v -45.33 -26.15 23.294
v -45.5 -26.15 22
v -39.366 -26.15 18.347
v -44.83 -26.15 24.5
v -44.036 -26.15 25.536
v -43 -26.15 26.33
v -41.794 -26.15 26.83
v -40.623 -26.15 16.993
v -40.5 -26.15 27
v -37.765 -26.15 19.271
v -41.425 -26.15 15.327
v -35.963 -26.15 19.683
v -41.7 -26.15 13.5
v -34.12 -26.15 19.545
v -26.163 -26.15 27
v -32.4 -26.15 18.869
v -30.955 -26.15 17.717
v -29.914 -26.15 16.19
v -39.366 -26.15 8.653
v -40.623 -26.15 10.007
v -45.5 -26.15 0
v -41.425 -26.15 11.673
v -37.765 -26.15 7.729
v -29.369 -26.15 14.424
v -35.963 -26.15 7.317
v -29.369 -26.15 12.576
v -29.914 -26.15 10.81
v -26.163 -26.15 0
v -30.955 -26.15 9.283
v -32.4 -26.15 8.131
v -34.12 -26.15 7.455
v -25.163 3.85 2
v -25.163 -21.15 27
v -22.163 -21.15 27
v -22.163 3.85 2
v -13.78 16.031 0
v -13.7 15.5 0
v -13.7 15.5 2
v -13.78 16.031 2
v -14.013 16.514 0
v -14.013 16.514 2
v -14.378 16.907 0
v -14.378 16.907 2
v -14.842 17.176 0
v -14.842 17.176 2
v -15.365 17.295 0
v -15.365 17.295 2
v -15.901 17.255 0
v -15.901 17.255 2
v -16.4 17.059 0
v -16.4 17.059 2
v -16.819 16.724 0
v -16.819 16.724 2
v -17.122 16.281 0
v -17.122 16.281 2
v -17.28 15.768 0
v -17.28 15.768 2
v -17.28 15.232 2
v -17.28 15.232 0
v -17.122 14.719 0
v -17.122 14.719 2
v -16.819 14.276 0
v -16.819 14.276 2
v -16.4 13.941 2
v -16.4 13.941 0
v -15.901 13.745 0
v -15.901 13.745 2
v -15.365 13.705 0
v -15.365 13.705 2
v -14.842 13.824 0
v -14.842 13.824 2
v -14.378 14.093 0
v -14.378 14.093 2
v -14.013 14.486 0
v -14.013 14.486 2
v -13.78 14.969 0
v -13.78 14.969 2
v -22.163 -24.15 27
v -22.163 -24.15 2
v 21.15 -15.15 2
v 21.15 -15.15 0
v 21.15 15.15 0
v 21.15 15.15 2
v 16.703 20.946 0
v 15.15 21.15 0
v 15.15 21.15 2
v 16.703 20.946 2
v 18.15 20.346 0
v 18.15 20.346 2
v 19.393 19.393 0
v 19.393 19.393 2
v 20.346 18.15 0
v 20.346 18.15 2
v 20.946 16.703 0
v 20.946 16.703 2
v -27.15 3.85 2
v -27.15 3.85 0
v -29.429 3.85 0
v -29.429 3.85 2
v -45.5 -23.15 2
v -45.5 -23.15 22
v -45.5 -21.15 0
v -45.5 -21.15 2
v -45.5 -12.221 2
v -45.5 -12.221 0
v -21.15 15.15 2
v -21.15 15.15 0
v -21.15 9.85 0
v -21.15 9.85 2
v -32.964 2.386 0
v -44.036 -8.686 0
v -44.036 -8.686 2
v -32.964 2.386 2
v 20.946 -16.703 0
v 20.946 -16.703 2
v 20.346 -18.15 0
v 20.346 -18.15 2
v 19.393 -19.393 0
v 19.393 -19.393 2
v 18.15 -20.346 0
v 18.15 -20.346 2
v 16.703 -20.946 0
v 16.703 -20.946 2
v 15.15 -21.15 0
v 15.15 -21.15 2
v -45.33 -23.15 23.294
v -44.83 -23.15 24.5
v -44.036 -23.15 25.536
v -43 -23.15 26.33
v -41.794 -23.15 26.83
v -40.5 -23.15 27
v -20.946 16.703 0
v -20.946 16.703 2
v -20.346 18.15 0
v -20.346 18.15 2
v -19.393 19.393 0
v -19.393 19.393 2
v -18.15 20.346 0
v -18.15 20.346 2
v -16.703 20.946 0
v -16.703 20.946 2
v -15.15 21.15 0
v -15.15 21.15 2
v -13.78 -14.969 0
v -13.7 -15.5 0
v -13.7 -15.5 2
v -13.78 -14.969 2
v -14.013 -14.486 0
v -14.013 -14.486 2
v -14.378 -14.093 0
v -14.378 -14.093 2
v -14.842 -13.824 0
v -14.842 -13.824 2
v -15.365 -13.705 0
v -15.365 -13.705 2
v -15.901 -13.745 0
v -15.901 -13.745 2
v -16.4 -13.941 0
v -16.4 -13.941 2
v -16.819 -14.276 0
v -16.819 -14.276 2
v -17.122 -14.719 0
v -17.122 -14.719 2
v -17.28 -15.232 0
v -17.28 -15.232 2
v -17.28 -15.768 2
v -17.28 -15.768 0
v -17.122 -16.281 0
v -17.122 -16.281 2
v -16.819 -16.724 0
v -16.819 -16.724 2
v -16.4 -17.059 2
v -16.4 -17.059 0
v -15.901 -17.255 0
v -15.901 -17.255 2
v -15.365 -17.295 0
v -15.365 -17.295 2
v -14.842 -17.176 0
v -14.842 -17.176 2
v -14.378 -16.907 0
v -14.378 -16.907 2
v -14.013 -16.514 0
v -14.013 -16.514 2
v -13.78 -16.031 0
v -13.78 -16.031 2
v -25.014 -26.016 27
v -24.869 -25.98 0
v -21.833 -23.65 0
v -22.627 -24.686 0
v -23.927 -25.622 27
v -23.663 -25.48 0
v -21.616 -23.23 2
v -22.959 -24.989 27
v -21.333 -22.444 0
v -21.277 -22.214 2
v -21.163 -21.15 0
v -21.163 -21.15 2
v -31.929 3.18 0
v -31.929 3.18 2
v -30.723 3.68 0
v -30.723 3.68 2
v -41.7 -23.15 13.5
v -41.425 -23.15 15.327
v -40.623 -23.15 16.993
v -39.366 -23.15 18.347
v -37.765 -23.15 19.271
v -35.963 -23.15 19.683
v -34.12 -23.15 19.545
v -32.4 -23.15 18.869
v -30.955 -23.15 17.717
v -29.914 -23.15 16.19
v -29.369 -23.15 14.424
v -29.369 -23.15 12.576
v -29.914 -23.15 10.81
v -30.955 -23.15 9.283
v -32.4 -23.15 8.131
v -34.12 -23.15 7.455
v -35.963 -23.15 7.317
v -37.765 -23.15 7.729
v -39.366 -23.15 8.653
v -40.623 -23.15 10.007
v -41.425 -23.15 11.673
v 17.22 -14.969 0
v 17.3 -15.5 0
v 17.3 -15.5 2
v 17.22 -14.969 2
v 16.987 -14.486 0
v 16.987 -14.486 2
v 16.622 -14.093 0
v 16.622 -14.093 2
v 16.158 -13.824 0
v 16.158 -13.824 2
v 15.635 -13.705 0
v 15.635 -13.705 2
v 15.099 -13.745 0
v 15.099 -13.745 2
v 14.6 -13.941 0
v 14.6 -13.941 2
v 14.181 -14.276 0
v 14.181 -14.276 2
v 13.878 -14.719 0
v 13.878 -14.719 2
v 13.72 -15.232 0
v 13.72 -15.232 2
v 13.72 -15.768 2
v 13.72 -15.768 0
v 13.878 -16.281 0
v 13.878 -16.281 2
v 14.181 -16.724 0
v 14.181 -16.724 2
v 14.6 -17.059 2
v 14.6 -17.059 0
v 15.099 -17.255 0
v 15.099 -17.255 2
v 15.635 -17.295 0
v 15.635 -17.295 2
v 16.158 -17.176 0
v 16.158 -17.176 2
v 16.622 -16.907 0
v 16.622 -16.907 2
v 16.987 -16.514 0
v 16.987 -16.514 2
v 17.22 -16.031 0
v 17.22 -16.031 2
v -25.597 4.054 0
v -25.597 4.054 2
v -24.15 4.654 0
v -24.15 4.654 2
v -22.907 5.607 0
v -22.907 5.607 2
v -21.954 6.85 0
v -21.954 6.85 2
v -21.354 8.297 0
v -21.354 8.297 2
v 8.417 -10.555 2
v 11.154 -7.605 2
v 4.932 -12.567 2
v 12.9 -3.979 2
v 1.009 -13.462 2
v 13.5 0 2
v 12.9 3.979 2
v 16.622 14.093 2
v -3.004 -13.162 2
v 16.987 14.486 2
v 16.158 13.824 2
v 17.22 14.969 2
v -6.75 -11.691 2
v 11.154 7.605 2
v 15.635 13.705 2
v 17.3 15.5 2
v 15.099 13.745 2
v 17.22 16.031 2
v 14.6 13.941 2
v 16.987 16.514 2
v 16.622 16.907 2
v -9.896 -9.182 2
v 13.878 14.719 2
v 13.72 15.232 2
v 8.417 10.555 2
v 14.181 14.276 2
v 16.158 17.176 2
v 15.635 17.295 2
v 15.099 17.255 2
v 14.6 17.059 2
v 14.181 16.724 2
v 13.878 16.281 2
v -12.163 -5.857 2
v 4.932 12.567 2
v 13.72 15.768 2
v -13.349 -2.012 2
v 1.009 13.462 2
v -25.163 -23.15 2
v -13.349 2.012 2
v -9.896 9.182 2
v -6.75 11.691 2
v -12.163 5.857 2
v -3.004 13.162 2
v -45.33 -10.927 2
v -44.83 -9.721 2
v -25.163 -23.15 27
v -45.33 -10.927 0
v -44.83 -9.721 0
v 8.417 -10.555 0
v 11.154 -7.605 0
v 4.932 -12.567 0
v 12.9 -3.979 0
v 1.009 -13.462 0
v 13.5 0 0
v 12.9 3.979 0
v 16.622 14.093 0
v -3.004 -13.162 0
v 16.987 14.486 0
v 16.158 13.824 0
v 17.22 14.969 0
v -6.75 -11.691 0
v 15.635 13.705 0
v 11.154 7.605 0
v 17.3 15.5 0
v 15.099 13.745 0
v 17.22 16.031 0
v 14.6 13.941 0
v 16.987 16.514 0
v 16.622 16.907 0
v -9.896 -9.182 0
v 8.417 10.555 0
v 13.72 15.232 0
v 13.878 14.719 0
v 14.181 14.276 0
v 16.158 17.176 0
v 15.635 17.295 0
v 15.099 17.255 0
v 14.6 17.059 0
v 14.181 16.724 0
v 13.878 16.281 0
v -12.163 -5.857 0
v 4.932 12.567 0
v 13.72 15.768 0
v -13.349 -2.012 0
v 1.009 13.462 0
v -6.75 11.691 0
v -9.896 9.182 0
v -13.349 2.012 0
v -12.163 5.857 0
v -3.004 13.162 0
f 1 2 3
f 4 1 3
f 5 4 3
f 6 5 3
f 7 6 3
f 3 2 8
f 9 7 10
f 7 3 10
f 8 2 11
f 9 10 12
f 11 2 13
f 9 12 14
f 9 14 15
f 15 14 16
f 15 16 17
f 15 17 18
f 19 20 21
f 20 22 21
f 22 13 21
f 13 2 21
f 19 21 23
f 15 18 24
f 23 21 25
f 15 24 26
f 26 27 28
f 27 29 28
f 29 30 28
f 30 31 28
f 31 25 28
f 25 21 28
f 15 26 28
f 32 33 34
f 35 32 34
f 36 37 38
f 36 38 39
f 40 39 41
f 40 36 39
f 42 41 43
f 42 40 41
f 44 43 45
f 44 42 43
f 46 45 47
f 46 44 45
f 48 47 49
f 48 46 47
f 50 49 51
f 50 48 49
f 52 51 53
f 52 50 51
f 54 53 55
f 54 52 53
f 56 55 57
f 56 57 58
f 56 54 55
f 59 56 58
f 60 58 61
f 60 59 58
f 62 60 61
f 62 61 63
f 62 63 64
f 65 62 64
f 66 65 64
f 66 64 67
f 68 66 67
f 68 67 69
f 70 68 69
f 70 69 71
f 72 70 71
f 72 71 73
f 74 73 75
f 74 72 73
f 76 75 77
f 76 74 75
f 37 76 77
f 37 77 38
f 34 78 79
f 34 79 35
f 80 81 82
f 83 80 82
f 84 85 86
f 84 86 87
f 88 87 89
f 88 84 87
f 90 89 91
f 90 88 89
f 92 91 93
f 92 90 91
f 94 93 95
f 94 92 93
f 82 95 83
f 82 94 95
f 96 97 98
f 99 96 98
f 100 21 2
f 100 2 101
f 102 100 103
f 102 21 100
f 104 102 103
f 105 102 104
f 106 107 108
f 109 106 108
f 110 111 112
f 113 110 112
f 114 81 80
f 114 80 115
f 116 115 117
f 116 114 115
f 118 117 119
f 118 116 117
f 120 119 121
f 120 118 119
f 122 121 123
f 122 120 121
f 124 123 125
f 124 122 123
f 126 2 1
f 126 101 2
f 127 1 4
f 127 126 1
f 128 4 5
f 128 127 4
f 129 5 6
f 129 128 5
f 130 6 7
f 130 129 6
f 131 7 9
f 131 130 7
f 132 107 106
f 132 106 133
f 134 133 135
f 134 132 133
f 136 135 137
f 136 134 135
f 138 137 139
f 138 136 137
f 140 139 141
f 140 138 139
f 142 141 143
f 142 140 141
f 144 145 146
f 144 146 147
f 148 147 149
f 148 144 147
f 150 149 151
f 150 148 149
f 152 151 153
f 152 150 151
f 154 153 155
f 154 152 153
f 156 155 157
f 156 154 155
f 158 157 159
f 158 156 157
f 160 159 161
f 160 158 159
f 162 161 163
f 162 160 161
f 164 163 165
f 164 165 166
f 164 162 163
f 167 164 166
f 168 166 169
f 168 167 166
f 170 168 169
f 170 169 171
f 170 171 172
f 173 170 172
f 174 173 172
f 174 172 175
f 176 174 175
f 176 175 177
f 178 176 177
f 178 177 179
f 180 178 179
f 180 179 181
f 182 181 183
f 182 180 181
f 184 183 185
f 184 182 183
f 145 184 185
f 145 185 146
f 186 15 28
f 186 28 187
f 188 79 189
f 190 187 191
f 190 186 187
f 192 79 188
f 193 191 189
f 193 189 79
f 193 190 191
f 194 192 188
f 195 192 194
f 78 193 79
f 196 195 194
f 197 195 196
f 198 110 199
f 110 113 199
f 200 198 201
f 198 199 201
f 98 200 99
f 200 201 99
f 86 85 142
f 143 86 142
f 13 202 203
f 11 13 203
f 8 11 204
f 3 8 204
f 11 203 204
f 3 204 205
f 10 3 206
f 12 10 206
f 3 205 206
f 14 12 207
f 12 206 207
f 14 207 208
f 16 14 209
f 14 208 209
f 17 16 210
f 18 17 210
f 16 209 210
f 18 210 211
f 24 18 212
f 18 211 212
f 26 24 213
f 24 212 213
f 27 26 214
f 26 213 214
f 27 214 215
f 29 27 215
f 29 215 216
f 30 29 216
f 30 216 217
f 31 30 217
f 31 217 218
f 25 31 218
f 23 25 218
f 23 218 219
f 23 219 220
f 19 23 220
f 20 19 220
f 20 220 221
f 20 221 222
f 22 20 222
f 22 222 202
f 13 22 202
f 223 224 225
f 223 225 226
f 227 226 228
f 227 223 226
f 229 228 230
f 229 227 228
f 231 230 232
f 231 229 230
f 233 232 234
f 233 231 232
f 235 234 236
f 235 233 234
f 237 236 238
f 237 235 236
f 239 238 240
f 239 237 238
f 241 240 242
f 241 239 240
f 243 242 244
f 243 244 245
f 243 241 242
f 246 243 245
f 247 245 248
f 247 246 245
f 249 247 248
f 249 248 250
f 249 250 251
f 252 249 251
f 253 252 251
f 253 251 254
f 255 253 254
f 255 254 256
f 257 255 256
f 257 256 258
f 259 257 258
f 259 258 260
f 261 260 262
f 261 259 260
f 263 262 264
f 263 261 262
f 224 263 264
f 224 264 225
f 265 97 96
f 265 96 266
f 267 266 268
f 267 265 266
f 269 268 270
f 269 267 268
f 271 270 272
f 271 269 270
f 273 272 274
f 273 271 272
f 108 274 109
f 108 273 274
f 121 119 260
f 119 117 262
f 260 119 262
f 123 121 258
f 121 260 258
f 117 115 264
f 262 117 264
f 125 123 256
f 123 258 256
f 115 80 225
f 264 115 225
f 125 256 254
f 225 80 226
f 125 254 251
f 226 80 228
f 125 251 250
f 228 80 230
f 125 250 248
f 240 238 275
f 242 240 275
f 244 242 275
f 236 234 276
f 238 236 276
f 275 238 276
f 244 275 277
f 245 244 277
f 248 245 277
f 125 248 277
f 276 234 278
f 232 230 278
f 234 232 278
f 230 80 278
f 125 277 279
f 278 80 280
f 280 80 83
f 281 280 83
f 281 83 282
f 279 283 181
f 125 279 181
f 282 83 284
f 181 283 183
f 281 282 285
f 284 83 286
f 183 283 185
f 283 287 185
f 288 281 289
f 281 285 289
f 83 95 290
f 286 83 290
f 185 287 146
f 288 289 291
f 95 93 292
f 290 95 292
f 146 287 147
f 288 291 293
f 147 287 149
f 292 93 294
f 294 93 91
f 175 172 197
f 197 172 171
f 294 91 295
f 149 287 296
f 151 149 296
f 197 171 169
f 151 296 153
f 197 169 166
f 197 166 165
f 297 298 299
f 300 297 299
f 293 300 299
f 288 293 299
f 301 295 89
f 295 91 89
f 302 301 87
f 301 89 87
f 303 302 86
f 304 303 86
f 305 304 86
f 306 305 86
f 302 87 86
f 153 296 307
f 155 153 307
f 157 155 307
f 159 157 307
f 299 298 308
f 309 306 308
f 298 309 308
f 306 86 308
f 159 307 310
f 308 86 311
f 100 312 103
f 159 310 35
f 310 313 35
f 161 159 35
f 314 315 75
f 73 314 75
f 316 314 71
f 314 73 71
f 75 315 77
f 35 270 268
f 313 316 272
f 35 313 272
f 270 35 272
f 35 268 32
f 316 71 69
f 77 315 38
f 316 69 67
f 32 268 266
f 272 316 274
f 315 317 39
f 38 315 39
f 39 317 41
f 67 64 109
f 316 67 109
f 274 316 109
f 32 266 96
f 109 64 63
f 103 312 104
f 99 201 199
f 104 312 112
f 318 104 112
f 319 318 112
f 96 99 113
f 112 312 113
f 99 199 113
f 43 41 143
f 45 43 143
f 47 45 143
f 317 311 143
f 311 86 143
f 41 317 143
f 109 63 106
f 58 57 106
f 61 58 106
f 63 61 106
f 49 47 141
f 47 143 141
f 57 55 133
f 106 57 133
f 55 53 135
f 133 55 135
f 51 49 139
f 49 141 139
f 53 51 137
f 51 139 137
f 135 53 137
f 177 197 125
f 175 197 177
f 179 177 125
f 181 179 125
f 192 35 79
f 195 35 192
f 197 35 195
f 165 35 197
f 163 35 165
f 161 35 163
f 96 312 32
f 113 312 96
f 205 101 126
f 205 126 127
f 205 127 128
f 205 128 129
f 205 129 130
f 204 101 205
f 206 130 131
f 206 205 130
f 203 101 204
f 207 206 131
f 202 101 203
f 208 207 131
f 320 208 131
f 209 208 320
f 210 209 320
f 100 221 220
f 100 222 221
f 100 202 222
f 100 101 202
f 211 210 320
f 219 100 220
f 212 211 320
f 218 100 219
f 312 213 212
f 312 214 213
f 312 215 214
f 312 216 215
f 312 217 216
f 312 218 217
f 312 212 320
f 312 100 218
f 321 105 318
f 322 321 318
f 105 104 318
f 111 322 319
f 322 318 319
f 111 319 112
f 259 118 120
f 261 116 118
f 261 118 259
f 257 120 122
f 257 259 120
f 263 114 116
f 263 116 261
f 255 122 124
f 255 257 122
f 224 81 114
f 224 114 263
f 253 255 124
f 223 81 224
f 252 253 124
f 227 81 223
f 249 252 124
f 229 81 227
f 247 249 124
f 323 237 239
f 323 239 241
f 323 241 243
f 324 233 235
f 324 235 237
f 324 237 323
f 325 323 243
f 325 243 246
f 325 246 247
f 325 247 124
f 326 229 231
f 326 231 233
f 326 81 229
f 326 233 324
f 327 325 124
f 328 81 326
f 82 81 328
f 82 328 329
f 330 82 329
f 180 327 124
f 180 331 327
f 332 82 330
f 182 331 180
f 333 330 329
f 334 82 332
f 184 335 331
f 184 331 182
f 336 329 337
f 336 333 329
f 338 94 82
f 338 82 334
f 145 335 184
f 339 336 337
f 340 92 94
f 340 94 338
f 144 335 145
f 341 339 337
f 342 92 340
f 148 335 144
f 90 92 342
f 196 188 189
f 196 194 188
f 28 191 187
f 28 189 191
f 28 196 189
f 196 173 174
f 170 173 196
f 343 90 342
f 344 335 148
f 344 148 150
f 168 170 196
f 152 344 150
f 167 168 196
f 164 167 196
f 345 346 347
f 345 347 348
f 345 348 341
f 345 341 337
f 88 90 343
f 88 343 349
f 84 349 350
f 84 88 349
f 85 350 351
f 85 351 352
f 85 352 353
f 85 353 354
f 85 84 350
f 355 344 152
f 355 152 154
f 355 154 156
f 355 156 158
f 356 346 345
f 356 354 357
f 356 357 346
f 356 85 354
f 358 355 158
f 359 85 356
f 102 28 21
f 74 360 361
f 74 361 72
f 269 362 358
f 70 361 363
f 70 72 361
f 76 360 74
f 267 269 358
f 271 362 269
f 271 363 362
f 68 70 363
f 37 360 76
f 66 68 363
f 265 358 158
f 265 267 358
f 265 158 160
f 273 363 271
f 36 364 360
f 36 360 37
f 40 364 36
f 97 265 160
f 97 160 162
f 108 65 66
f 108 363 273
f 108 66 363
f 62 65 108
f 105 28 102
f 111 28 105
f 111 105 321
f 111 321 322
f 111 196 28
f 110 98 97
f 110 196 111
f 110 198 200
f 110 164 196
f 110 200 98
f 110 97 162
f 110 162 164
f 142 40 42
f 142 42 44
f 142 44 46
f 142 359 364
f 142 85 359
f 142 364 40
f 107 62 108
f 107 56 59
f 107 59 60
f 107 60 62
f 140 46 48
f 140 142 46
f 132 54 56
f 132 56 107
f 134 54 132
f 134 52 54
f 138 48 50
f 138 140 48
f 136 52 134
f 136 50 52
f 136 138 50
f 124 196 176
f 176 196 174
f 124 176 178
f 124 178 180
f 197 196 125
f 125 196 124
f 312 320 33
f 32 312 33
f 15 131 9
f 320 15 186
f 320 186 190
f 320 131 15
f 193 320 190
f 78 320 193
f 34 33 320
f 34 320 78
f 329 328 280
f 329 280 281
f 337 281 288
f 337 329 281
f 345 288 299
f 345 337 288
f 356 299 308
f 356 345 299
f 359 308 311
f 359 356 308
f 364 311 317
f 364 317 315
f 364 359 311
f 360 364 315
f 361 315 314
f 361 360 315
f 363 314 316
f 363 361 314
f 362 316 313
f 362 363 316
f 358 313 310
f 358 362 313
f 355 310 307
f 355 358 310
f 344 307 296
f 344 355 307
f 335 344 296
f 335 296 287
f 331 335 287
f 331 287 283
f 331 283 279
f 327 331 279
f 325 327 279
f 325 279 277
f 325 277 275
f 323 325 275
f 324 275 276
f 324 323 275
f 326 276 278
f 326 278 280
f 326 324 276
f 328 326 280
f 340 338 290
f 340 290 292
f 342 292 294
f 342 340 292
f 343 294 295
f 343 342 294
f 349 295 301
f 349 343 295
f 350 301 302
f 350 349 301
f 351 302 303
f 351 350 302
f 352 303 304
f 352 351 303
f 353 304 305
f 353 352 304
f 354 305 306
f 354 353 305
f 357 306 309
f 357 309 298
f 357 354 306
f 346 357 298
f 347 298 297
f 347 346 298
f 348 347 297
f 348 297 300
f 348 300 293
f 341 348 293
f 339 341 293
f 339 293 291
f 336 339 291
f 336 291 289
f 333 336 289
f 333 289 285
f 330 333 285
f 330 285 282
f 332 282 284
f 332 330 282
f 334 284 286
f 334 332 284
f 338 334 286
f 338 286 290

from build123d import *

# Parameters (mm, degrees)
F0_R         = 1.8
F0_R_2       = 13.5
F0_W         = 24.3372796029
F0_H         = 5
F1_DEPTH     = 2
F2_W         = 3
F2_H         = 30
F3_DEPTH     = 27
F4_W         = 20.3372796029
F4_H         = 3
F5_DEPTH     = 25
F7_SIZE      = 25
F8_SIZE      = 14
F9_R         = 4.99999
F10_T1_DEPTH = 2
F10_T3_DEPTH = 32
F6_R         = 6.2
F11_DEPTH    = 25


# Not quite as in the source:
# - a fillet or chamfer that OpenCascade refuses, or shapes differently, is made with other operations: its cross-section is extruded or revolved along the edge and cut away or added
# - a fillet or chamfer is up to 0.001 mm smaller than in the source, because OpenCascade refuses the exact size


with BuildPart() as f1:
    # F0 (on Top) → F1 (new body)
    with BuildSketch(Plane.XY):
        Polygon((21.15, -21.15), (21.15, 21.15), (-21.15, 21.15), (-21.15, 3.85), (-21.15, -21.15), align=None)
        with Locations((-15.5, -15.5)):
            Circle(F0_R, mode=Mode.SUBTRACT)
        with Locations((15.5, -15.5)):
            Circle(F0_R, mode=Mode.SUBTRACT)
        with Locations((-15.5, 15.5)):
            Circle(F0_R, mode=Mode.SUBTRACT)
        Circle(F0_R_2, mode=Mode.SUBTRACT)
        with Locations((15.5, 15.5)):
            Circle(F0_R, mode=Mode.SUBTRACT)
        Polygon((-21.15, -21.15), (-21.15, 3.85), (-45.5, 3.85), (-45.5, -21.15), (-21.1627203971, -21.15), align=None)
        with Locations((-33.3313601986, -23.65)):
            Rectangle(F0_W, F0_H)
    extrude(amount=F1_DEPTH)

    # F2 (on Top) → F3 (join)
    with BuildSketch(Plane.XY):
        with Locations((-23.6627203971, -11.15)):
            Rectangle(F2_W, F2_H)
    extrude(amount=F3_DEPTH)

    # F4 (on face) → F5 (join)
    with BuildSketch(Plane.XY.offset(2)):
        with Locations((-35.3313601986, -24.65)):
            Rectangle(F4_W, F4_H)
    extrude(amount=F5_DEPTH)

    # F7
    f7_edges = [f1.edges().sort_by_distance(p)[0] for p in [
        (-23.66272, 3.85, 27),
    ]]
    chamfer(f7_edges, length=F7_SIZE)

    # F8
    f8_edges = [f1.edges().sort_by_distance(p)[0] for p in [
        (-45.5, 3.85, 1),
    ]]
    chamfer(f8_edges, length=F8_SIZE)

    # F9 (radius 5 in the source; OpenCascade refuses exactly that, so slightly less here)
    f9_edges = [f1.edges().sort_by_distance(p)[0] for p in [
        (-45.5, -10.15, 1),
        (-31.5, 3.85, 1),
        (-21.16272, -26.15, 1),
        (-45.5, -24.65, 27),
    ]]
    fillet(f9_edges, radius=F9_R)

    # F10: fillet of radius 6 on 4 edges, made by hand

    # F10_s2 → F10_t1 (join)
    with BuildSketch(Plane.XY):
        with BuildLine():
            ThreePointArc((-27.15, 3.85), (-22.9073593129, 5.6073593129), (-21.15, 9.85))
            Line((-21.15, 9.85), (-21.15, 3.85))
            Line((-21.15, 3.85), (-27.15, 3.85))
        make_face()
    extrude(amount=F10_T1_DEPTH)

    # F10_s4 → F10_t3 (cut)
    with BuildSketch(Plane.XY.offset(-15)):
        with BuildLine():
            ThreePointArc((21.15, -15.15), (19.3926406871, -19.3926406871), (15.15, -21.15))
            Line((15.15, -21.15), (21.15, -21.15))
            Line((21.15, -21.15), (21.15, -15.15))
        make_face()
        with BuildLine():
            ThreePointArc((15.15, 21.15), (19.3926406871, 19.3926406871), (21.15, 15.15))
            Line((21.15, 15.15), (21.15, 21.15))
            Line((21.15, 21.15), (15.15, 21.15))
        make_face()
        with BuildLine():
            ThreePointArc((-21.15, 15.15), (-19.3926406871, 19.3926406871), (-15.15, 21.15))
            Line((-15.15, 21.15), (-21.15, 21.15))
            Line((-21.15, 21.15), (-21.15, 15.15))
        make_face()
    extrude(amount=F10_T3_DEPTH, mode=Mode.SUBTRACT)

    # F6 (on face) + F5_face1 (on face) → F11 (cut)
    with BuildSketch(Plane(origin=(0, -23.15, 0), x_dir=(-1, 0, 0), z_dir=(0, 1, 0))):
        with Locations((35.5, 13.5)):
            Circle(F6_R)
    with BuildSketch(Plane(origin=(-35.7425668405, -26.15, 13.3714329468), x_dir=(1, 0, 0), z_dir=(0, -1, 0))):
        with BuildLine():
            Line((-9.7574331595, -13.3714329468), (9.5798564434, -13.3714329468))
            Line((9.5798564434, -13.3714329468), (9.5798564434, 13.6285670532))
            Line((9.5798564434, 13.6285670532), (-4.7574431595, 13.6285670532))
            ThreePointArc((-4.7574431595, 13.6285670532), (-8.2929699944, 12.1641038881), (-9.7574331595, 8.6285770532))
            Line((-9.7574331595, 8.6285770532), (-9.7574331595, -13.3714329468))
        make_face()
    extrude(amount=-F11_DEPTH, dir=(0, 1, 0), mode=Mode.SUBTRACT)


solid = f1.part
